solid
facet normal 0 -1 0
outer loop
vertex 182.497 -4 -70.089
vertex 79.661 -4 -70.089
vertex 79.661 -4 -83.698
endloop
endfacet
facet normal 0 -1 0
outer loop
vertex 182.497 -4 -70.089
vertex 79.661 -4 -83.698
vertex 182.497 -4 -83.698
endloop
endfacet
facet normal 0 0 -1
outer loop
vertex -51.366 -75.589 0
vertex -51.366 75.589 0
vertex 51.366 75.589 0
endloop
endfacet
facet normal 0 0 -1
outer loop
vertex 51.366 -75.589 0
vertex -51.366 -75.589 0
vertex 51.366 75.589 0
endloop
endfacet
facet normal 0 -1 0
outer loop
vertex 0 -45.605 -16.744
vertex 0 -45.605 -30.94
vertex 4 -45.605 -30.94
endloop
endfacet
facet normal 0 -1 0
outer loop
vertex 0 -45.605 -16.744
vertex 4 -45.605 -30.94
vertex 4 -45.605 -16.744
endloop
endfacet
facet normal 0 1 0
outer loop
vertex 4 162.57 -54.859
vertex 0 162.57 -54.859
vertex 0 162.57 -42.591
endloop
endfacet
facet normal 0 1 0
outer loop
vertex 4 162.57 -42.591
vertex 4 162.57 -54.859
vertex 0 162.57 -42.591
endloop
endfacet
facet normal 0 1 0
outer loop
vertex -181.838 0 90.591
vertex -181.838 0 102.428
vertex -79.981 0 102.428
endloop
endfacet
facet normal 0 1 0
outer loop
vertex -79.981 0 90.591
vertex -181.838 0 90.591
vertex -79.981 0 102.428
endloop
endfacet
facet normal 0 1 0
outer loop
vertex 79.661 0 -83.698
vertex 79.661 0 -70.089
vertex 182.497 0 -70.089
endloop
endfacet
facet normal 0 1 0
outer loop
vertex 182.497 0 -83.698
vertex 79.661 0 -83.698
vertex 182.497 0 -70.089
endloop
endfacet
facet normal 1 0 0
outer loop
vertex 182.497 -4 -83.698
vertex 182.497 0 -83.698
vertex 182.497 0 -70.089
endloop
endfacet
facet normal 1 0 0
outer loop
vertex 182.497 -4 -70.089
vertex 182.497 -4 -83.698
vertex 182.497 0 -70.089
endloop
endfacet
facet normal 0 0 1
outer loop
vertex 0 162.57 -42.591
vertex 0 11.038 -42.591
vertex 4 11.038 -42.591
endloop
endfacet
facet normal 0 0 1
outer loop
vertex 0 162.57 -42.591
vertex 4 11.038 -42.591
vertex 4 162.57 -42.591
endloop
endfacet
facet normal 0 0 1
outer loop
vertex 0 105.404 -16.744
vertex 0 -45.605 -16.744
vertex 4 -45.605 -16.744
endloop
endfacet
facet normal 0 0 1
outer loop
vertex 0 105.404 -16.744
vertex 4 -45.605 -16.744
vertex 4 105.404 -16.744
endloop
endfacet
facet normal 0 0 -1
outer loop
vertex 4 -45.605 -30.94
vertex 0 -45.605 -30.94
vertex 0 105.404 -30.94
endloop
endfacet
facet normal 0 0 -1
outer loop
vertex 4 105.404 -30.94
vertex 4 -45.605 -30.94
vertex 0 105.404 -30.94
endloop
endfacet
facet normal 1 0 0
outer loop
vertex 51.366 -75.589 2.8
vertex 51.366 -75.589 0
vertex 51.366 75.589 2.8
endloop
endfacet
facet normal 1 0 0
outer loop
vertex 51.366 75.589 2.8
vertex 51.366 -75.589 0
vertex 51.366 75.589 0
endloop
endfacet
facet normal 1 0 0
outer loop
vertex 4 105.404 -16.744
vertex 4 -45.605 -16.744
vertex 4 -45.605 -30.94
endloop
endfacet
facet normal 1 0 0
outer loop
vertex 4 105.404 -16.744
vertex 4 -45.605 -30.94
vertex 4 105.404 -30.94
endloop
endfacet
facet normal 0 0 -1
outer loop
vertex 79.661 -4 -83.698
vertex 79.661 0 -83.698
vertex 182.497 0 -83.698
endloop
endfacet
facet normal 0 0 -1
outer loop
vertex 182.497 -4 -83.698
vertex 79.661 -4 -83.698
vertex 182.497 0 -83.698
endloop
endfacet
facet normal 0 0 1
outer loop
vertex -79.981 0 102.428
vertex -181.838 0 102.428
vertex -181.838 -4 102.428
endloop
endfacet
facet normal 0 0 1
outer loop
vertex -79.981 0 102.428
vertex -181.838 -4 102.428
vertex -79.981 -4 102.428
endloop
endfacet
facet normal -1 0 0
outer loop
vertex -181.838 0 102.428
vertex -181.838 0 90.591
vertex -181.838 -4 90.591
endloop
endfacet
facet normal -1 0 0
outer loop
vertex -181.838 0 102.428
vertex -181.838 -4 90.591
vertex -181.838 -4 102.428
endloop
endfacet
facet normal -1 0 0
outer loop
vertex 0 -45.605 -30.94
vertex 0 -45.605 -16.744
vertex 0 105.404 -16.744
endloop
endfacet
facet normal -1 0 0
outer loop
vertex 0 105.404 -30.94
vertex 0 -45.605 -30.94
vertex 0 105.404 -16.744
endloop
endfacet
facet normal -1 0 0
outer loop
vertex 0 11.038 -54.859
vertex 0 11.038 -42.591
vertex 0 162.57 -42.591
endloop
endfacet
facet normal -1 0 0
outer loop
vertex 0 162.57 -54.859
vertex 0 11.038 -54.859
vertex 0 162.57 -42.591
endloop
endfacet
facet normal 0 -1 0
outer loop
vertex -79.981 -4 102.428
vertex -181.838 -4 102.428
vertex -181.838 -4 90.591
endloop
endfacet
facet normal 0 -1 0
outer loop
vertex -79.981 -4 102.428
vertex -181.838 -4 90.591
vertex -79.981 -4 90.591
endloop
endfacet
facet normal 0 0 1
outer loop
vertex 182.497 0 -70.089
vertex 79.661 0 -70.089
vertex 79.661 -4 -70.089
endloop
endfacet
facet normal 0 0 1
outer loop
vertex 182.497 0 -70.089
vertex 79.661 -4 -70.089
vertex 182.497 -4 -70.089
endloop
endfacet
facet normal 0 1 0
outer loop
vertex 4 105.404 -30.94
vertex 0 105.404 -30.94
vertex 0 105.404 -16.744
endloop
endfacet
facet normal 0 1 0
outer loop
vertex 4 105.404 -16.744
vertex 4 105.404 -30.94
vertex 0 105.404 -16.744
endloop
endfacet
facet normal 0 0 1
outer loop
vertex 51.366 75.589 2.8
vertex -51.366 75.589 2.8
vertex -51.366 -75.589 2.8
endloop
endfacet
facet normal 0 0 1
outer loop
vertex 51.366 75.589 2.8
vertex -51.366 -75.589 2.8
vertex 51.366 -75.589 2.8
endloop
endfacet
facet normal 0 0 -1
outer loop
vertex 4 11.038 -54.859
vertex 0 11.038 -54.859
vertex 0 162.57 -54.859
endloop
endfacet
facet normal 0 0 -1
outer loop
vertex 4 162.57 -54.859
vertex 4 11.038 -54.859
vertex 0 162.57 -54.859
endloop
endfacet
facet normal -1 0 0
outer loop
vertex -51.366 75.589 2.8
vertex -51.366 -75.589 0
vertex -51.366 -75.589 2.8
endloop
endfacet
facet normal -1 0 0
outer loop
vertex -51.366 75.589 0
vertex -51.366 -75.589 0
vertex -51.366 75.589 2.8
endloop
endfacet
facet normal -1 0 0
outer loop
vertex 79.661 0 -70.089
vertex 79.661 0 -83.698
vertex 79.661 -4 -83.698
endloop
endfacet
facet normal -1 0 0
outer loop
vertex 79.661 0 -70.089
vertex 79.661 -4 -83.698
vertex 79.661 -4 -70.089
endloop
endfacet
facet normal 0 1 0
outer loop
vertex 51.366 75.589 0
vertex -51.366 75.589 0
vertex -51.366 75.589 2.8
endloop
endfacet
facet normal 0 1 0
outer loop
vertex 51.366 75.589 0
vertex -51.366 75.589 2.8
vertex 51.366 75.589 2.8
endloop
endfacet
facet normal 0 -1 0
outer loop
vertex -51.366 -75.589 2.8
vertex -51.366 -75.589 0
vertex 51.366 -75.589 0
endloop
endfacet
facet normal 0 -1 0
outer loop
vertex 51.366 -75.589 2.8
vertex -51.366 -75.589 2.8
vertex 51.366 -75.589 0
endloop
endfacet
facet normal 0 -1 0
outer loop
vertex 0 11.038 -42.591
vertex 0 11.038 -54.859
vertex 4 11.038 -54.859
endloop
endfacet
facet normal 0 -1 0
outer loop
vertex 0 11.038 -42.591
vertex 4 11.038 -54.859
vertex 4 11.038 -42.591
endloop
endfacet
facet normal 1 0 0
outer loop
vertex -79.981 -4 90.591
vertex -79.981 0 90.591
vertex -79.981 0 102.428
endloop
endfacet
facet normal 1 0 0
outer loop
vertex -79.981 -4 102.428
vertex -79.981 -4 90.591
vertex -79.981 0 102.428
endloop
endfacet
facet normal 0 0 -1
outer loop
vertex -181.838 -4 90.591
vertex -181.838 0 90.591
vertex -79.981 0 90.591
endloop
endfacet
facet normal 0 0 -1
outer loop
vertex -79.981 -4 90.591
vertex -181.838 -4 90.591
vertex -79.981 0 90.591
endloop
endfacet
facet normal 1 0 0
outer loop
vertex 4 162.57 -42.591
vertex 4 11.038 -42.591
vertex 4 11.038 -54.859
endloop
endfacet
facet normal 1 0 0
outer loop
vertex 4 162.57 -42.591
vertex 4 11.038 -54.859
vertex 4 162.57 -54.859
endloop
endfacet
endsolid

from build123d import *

# Parameters (mm, degrees)
F0_W     = 102.731034
F0_H     = 151.177152
F1_DEPTH = 2.8
F2_W     = 151.009284
F2_H     = 14.196156
F3_DEPTH = 4
F4_W     = 151.532307
F4_H     = 12.267362
F5_DEPTH = 4
F6_W     = 102.836437
F6_H     = 13.608955
F7_DEPTH = 4
F8_W     = 101.857022
F8_H     = 11.83685
F9_DEPTH = 4


with BuildPart() as f1:
    # F0 (on Top) → F1 (new body)
    with BuildSketch(Plane.XY):
        Rectangle(F0_W, F0_H)
    extrude(amount=F1_DEPTH)


with BuildPart() as f3:
    # F2 (on Right) → F3 (new body)
    with BuildSketch(Plane.YZ):
        with Locations((29.899839, -23.842362)):
            Rectangle(F2_W, F2_H)
    extrude(amount=F3_DEPTH)


with BuildPart() as f5:
    # F4 (on Right) → F5 (new body)
    with BuildSketch(Plane.YZ):
        with Locations((86.804323, -48.724914)):
            Rectangle(F4_W, F4_H)
    extrude(amount=F5_DEPTH)


with BuildPart() as f7:
    # F6 (on Front) → F7 (new body)
    with BuildSketch(Plane.XZ):
        with Locations((131.078835, -76.893512)):
            Rectangle(F6_W, F6_H)
    extrude(amount=F7_DEPTH)


with BuildPart() as f9:
    # F8 (on Front) → F9 (new body)
    with BuildSketch(Plane.XZ):
        with Locations((-130.909182, 96.50952)):
            Rectangle(F8_W, F8_H)
    extrude(amount=F9_DEPTH)


solid = Compound([f1.part, f3.part, f5.part, f7.part, f9.part])
